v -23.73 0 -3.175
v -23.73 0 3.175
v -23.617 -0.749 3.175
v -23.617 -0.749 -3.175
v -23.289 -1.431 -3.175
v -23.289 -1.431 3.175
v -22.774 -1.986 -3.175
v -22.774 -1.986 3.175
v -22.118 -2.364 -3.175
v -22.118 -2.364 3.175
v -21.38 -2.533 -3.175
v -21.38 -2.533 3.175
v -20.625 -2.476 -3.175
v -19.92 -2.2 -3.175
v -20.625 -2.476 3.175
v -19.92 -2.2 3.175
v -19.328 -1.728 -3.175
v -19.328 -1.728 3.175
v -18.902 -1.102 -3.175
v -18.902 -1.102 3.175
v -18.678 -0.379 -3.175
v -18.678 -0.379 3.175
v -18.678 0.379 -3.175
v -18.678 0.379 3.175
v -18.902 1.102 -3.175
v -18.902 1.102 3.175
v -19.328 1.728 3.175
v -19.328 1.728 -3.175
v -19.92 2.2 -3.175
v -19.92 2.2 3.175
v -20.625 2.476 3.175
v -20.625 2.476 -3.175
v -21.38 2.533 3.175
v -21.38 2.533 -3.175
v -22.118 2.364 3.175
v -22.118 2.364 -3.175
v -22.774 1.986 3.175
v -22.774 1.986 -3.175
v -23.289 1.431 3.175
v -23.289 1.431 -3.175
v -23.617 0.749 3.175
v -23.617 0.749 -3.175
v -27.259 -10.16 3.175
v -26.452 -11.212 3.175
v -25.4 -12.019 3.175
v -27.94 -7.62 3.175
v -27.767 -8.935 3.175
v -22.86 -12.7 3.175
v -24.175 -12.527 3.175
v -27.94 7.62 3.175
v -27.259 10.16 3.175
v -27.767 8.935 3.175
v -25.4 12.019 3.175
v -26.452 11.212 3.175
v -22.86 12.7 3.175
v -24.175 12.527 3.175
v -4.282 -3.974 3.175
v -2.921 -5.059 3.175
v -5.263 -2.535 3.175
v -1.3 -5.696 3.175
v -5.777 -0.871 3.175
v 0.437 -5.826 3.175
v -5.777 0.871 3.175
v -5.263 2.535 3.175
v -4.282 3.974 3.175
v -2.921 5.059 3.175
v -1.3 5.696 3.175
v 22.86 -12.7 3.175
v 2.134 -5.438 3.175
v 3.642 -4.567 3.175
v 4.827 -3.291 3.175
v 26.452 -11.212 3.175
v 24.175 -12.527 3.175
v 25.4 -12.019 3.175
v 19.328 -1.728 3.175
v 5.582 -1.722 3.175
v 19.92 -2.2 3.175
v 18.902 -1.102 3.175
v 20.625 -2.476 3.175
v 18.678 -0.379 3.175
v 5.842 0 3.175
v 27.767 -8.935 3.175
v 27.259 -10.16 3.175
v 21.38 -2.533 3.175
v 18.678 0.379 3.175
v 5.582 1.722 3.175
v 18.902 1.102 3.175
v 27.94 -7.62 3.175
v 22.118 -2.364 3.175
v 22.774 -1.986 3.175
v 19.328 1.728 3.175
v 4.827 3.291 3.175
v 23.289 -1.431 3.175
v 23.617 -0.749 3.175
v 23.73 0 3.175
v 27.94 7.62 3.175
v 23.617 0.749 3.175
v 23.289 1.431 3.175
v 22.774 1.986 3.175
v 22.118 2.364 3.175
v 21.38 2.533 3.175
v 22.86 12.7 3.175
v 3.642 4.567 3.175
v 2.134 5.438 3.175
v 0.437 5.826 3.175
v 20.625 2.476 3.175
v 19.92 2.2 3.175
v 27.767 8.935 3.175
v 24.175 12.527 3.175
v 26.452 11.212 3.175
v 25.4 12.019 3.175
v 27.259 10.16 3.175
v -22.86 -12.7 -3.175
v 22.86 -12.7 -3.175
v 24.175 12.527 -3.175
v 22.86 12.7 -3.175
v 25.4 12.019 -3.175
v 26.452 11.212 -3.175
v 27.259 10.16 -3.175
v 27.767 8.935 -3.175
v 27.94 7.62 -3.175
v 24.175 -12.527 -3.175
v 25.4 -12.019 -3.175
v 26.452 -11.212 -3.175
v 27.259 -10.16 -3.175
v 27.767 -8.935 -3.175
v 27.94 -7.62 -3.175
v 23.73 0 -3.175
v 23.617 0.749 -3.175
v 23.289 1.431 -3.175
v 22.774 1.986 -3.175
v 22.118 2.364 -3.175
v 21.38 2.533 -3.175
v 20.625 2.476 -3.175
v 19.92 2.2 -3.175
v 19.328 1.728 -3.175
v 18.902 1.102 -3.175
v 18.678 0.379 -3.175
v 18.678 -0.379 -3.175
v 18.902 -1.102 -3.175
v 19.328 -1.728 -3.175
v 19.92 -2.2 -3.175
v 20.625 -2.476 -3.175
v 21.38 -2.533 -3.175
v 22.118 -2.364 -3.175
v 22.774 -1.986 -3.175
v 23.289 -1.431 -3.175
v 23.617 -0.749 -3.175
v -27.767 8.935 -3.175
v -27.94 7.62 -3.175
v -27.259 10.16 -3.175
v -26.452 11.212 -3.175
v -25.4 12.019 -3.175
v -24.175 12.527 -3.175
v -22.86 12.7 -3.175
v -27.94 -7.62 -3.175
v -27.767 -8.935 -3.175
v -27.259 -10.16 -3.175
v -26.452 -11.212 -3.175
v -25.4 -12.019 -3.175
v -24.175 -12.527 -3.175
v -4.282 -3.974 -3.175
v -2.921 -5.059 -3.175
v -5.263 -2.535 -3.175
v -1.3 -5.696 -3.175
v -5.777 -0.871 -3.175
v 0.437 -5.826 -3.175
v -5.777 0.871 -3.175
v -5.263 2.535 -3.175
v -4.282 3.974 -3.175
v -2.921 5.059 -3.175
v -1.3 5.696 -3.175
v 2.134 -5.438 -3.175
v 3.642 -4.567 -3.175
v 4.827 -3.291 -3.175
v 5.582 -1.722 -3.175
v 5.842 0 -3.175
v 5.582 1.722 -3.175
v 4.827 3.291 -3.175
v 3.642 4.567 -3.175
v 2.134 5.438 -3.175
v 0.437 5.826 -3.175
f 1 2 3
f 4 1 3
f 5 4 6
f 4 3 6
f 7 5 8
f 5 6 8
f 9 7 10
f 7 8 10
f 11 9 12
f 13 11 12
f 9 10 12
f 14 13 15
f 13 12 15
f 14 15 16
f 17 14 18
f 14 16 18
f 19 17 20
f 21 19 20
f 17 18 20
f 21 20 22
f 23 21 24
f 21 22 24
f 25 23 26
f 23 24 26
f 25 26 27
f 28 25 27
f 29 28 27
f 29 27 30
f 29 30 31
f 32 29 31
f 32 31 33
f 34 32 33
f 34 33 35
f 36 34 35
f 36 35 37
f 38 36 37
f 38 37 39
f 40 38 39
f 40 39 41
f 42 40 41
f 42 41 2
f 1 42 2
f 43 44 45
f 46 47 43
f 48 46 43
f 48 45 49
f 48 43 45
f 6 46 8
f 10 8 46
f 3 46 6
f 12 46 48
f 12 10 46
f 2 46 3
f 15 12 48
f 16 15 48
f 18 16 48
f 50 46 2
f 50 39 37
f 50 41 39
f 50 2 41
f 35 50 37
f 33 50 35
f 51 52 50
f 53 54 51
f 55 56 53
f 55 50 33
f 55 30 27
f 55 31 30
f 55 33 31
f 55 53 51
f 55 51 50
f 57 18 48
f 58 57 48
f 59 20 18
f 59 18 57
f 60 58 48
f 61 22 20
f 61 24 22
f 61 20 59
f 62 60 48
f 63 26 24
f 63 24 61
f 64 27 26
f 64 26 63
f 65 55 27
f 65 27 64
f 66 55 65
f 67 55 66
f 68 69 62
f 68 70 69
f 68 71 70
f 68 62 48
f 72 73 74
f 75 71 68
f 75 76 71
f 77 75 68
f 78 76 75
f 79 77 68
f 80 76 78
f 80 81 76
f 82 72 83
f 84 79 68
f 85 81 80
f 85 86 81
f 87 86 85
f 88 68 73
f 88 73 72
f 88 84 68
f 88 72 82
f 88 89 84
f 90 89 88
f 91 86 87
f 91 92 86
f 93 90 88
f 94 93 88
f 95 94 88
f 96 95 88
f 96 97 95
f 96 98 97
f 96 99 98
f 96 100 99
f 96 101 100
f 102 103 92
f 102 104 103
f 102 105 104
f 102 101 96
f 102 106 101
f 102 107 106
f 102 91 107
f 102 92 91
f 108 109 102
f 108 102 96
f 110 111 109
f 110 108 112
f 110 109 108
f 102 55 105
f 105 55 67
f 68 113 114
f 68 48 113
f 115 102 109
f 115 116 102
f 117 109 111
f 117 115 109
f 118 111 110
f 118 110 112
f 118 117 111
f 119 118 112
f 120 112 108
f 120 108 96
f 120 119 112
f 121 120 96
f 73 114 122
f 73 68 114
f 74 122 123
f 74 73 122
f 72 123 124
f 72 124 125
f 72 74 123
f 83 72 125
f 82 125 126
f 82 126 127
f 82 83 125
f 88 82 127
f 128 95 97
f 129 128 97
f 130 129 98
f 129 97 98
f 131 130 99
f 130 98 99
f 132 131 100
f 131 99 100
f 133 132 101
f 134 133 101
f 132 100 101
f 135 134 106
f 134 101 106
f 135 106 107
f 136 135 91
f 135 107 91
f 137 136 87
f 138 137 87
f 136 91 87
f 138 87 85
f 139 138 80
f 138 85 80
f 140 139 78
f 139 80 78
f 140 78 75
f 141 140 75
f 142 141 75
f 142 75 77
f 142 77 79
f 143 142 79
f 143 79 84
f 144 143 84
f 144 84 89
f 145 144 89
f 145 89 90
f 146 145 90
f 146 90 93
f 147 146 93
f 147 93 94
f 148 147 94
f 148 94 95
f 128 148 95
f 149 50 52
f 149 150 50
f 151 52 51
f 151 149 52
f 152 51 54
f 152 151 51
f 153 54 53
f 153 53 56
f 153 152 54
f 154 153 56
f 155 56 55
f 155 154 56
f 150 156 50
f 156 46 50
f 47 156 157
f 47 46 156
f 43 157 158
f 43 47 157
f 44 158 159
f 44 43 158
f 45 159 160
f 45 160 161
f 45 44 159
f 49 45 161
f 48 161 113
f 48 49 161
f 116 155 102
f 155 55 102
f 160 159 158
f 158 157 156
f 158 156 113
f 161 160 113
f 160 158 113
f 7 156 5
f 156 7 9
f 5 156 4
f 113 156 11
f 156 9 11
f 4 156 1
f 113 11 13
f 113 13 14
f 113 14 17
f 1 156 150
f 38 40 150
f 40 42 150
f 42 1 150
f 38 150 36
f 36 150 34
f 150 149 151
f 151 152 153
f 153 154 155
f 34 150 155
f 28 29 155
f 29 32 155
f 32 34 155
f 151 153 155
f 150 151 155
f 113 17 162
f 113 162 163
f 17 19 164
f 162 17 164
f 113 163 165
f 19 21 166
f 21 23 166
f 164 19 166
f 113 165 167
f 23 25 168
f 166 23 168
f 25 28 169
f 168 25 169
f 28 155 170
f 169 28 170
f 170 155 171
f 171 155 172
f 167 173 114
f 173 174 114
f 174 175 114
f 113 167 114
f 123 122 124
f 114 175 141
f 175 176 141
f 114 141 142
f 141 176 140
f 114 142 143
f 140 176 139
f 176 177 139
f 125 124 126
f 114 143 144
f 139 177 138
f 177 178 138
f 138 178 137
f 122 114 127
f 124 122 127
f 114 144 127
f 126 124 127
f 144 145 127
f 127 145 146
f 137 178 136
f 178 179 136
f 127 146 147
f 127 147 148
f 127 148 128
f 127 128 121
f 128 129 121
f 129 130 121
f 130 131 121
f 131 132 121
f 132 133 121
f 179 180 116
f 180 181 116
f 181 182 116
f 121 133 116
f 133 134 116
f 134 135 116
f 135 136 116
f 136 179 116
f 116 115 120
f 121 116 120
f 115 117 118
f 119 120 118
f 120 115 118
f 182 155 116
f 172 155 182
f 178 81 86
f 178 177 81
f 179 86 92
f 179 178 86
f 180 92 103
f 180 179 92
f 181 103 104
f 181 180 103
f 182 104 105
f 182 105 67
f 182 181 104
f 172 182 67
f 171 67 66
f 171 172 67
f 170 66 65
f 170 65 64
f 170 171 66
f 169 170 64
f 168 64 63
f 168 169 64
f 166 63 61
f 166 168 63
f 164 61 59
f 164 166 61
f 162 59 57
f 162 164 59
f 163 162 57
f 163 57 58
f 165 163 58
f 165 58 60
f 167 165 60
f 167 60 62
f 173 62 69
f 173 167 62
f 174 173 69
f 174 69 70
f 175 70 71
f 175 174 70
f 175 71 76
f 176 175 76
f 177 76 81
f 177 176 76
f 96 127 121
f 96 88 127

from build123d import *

# Parameters (mm, degrees)
SKETCH1_W              = 55.88
SKETCH1_H              = 25.4
SKETCH1_R              = 5.842
BOSS_EXTRUDE1_DEPTH    = 3.175
SKETCH2_R              = 2.54
CUT_EXTRUDE_4_40_DEPTH = 32.340965205
FILLET1_R              = 5.08


with BuildPart() as part:
    # Sketch1 → Boss-Extrude1 (new, symmetric)
    with BuildSketch(Plane.XY):
        Rectangle(SKETCH1_W, SKETCH1_H)
        Circle(SKETCH1_R, mode=Mode.SUBTRACT)
    extrude(amount=BOSS_EXTRUDE1_DEPTH, both=True)

    # Sketch2 → Cut-Extrude 4-40 (cut, through all)
    with BuildSketch(Plane.XY.offset(3.175)):
        with Locations((21.19, 0)):
            Circle(SKETCH2_R)
        with Locations(Location((-21.19, 0, 0), (0, 0, 180))):
            Circle(SKETCH2_R)
    extrude(amount=-CUT_EXTRUDE_4_40_DEPTH, mode=Mode.SUBTRACT)

    # Fillet1
    fillet1_edges = [part.edges().sort_by_distance(p)[0] for p in [
        (27.94, -12.7, 0),
        (-27.94, -12.7, 0),
        (-27.94, 12.7, 0),
        (27.94, 12.7, 0),
    ]]
    fillet(fillet1_edges, radius=FILLET1_R)


solid = part.part
